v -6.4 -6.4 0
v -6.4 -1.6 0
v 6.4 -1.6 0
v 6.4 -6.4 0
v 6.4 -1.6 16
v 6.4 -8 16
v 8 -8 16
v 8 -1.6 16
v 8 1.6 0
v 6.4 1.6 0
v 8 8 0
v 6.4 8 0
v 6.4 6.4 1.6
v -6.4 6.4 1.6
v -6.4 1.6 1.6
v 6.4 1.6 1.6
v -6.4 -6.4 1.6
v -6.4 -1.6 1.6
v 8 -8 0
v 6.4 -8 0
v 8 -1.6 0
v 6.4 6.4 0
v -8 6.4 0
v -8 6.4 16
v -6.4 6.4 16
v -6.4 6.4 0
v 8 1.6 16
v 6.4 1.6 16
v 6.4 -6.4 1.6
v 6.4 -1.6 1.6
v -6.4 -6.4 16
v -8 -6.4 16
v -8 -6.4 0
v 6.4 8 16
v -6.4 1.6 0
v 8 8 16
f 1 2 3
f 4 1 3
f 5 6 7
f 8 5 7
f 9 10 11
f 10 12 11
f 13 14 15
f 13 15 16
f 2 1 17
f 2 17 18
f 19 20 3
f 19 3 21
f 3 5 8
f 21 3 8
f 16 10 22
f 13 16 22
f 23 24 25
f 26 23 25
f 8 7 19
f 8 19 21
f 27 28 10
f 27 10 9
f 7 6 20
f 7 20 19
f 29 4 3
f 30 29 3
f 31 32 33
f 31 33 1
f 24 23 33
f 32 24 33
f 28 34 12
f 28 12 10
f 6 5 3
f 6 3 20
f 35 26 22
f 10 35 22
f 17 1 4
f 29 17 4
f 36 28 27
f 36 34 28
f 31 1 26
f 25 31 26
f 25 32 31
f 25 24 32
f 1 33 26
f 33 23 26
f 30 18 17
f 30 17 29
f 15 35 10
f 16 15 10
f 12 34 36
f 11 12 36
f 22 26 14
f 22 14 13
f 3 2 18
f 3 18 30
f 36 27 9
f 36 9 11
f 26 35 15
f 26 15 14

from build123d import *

# Parameters (mm, degrees)
F1_W     = 1.6
F1_H     = 1.6
F1_H_2   = 4.8
F2_DEPTH = 16
F1_H_3   = 3.2
F1_W_2   = 12.8
F3_DEPTH = 1.6


with BuildPart() as f2:
    # F1 (on Top) → F2 (new body)
    with BuildSketch(Plane.XY):
        with Locations((7.2, -7.2)):
            Rectangle(F1_W, F1_H)
        with Locations((7.2, -4)):
            Rectangle(F1_W, F1_H_2)
    extrude(amount=F2_DEPTH)


with BuildPart() as f2b:
    # F1 (on Top) → F2, piece 2 (new body)
    with BuildSketch(Plane.XY):
        with Locations((-7.2, -4)):
            Rectangle(F1_W, F1_H_2)
        with Locations((-7.2, 0)):
            Rectangle(F1_W, F1_H_3)
        with Locations((-7.2, 4)):
            Rectangle(F1_W, F1_H_2)
    extrude(amount=F2_DEPTH)


with BuildPart() as f2c:
    # F1 (on Top) → F2, piece 3 (new body)
    with BuildSketch(Plane.XY):
        with Locations((7.2, 4)):
            Rectangle(F1_W, F1_H_2)
        with Locations((7.2, 7.2)):
            Rectangle(F1_W, F1_H)
    extrude(amount=F2_DEPTH)


with BuildPart() as f3:
    # F1 (on Top) → F3 (new body)
    with BuildSketch(Plane.XY):
        with Locations((0, 4)):
            Rectangle(F1_W_2, F1_H_2)
    extrude(amount=F3_DEPTH)


with BuildPart() as f3b:
    # F1 (on Top) → F3, piece 2 (new body)
    with BuildSketch(Plane.XY):
        with Locations((0, -4)):
            Rectangle(F1_W_2, F1_H_2)
    extrude(amount=F3_DEPTH)


solid = Compound([f2.part, f2b.part, f2c.part, f3.part, f3b.part])
